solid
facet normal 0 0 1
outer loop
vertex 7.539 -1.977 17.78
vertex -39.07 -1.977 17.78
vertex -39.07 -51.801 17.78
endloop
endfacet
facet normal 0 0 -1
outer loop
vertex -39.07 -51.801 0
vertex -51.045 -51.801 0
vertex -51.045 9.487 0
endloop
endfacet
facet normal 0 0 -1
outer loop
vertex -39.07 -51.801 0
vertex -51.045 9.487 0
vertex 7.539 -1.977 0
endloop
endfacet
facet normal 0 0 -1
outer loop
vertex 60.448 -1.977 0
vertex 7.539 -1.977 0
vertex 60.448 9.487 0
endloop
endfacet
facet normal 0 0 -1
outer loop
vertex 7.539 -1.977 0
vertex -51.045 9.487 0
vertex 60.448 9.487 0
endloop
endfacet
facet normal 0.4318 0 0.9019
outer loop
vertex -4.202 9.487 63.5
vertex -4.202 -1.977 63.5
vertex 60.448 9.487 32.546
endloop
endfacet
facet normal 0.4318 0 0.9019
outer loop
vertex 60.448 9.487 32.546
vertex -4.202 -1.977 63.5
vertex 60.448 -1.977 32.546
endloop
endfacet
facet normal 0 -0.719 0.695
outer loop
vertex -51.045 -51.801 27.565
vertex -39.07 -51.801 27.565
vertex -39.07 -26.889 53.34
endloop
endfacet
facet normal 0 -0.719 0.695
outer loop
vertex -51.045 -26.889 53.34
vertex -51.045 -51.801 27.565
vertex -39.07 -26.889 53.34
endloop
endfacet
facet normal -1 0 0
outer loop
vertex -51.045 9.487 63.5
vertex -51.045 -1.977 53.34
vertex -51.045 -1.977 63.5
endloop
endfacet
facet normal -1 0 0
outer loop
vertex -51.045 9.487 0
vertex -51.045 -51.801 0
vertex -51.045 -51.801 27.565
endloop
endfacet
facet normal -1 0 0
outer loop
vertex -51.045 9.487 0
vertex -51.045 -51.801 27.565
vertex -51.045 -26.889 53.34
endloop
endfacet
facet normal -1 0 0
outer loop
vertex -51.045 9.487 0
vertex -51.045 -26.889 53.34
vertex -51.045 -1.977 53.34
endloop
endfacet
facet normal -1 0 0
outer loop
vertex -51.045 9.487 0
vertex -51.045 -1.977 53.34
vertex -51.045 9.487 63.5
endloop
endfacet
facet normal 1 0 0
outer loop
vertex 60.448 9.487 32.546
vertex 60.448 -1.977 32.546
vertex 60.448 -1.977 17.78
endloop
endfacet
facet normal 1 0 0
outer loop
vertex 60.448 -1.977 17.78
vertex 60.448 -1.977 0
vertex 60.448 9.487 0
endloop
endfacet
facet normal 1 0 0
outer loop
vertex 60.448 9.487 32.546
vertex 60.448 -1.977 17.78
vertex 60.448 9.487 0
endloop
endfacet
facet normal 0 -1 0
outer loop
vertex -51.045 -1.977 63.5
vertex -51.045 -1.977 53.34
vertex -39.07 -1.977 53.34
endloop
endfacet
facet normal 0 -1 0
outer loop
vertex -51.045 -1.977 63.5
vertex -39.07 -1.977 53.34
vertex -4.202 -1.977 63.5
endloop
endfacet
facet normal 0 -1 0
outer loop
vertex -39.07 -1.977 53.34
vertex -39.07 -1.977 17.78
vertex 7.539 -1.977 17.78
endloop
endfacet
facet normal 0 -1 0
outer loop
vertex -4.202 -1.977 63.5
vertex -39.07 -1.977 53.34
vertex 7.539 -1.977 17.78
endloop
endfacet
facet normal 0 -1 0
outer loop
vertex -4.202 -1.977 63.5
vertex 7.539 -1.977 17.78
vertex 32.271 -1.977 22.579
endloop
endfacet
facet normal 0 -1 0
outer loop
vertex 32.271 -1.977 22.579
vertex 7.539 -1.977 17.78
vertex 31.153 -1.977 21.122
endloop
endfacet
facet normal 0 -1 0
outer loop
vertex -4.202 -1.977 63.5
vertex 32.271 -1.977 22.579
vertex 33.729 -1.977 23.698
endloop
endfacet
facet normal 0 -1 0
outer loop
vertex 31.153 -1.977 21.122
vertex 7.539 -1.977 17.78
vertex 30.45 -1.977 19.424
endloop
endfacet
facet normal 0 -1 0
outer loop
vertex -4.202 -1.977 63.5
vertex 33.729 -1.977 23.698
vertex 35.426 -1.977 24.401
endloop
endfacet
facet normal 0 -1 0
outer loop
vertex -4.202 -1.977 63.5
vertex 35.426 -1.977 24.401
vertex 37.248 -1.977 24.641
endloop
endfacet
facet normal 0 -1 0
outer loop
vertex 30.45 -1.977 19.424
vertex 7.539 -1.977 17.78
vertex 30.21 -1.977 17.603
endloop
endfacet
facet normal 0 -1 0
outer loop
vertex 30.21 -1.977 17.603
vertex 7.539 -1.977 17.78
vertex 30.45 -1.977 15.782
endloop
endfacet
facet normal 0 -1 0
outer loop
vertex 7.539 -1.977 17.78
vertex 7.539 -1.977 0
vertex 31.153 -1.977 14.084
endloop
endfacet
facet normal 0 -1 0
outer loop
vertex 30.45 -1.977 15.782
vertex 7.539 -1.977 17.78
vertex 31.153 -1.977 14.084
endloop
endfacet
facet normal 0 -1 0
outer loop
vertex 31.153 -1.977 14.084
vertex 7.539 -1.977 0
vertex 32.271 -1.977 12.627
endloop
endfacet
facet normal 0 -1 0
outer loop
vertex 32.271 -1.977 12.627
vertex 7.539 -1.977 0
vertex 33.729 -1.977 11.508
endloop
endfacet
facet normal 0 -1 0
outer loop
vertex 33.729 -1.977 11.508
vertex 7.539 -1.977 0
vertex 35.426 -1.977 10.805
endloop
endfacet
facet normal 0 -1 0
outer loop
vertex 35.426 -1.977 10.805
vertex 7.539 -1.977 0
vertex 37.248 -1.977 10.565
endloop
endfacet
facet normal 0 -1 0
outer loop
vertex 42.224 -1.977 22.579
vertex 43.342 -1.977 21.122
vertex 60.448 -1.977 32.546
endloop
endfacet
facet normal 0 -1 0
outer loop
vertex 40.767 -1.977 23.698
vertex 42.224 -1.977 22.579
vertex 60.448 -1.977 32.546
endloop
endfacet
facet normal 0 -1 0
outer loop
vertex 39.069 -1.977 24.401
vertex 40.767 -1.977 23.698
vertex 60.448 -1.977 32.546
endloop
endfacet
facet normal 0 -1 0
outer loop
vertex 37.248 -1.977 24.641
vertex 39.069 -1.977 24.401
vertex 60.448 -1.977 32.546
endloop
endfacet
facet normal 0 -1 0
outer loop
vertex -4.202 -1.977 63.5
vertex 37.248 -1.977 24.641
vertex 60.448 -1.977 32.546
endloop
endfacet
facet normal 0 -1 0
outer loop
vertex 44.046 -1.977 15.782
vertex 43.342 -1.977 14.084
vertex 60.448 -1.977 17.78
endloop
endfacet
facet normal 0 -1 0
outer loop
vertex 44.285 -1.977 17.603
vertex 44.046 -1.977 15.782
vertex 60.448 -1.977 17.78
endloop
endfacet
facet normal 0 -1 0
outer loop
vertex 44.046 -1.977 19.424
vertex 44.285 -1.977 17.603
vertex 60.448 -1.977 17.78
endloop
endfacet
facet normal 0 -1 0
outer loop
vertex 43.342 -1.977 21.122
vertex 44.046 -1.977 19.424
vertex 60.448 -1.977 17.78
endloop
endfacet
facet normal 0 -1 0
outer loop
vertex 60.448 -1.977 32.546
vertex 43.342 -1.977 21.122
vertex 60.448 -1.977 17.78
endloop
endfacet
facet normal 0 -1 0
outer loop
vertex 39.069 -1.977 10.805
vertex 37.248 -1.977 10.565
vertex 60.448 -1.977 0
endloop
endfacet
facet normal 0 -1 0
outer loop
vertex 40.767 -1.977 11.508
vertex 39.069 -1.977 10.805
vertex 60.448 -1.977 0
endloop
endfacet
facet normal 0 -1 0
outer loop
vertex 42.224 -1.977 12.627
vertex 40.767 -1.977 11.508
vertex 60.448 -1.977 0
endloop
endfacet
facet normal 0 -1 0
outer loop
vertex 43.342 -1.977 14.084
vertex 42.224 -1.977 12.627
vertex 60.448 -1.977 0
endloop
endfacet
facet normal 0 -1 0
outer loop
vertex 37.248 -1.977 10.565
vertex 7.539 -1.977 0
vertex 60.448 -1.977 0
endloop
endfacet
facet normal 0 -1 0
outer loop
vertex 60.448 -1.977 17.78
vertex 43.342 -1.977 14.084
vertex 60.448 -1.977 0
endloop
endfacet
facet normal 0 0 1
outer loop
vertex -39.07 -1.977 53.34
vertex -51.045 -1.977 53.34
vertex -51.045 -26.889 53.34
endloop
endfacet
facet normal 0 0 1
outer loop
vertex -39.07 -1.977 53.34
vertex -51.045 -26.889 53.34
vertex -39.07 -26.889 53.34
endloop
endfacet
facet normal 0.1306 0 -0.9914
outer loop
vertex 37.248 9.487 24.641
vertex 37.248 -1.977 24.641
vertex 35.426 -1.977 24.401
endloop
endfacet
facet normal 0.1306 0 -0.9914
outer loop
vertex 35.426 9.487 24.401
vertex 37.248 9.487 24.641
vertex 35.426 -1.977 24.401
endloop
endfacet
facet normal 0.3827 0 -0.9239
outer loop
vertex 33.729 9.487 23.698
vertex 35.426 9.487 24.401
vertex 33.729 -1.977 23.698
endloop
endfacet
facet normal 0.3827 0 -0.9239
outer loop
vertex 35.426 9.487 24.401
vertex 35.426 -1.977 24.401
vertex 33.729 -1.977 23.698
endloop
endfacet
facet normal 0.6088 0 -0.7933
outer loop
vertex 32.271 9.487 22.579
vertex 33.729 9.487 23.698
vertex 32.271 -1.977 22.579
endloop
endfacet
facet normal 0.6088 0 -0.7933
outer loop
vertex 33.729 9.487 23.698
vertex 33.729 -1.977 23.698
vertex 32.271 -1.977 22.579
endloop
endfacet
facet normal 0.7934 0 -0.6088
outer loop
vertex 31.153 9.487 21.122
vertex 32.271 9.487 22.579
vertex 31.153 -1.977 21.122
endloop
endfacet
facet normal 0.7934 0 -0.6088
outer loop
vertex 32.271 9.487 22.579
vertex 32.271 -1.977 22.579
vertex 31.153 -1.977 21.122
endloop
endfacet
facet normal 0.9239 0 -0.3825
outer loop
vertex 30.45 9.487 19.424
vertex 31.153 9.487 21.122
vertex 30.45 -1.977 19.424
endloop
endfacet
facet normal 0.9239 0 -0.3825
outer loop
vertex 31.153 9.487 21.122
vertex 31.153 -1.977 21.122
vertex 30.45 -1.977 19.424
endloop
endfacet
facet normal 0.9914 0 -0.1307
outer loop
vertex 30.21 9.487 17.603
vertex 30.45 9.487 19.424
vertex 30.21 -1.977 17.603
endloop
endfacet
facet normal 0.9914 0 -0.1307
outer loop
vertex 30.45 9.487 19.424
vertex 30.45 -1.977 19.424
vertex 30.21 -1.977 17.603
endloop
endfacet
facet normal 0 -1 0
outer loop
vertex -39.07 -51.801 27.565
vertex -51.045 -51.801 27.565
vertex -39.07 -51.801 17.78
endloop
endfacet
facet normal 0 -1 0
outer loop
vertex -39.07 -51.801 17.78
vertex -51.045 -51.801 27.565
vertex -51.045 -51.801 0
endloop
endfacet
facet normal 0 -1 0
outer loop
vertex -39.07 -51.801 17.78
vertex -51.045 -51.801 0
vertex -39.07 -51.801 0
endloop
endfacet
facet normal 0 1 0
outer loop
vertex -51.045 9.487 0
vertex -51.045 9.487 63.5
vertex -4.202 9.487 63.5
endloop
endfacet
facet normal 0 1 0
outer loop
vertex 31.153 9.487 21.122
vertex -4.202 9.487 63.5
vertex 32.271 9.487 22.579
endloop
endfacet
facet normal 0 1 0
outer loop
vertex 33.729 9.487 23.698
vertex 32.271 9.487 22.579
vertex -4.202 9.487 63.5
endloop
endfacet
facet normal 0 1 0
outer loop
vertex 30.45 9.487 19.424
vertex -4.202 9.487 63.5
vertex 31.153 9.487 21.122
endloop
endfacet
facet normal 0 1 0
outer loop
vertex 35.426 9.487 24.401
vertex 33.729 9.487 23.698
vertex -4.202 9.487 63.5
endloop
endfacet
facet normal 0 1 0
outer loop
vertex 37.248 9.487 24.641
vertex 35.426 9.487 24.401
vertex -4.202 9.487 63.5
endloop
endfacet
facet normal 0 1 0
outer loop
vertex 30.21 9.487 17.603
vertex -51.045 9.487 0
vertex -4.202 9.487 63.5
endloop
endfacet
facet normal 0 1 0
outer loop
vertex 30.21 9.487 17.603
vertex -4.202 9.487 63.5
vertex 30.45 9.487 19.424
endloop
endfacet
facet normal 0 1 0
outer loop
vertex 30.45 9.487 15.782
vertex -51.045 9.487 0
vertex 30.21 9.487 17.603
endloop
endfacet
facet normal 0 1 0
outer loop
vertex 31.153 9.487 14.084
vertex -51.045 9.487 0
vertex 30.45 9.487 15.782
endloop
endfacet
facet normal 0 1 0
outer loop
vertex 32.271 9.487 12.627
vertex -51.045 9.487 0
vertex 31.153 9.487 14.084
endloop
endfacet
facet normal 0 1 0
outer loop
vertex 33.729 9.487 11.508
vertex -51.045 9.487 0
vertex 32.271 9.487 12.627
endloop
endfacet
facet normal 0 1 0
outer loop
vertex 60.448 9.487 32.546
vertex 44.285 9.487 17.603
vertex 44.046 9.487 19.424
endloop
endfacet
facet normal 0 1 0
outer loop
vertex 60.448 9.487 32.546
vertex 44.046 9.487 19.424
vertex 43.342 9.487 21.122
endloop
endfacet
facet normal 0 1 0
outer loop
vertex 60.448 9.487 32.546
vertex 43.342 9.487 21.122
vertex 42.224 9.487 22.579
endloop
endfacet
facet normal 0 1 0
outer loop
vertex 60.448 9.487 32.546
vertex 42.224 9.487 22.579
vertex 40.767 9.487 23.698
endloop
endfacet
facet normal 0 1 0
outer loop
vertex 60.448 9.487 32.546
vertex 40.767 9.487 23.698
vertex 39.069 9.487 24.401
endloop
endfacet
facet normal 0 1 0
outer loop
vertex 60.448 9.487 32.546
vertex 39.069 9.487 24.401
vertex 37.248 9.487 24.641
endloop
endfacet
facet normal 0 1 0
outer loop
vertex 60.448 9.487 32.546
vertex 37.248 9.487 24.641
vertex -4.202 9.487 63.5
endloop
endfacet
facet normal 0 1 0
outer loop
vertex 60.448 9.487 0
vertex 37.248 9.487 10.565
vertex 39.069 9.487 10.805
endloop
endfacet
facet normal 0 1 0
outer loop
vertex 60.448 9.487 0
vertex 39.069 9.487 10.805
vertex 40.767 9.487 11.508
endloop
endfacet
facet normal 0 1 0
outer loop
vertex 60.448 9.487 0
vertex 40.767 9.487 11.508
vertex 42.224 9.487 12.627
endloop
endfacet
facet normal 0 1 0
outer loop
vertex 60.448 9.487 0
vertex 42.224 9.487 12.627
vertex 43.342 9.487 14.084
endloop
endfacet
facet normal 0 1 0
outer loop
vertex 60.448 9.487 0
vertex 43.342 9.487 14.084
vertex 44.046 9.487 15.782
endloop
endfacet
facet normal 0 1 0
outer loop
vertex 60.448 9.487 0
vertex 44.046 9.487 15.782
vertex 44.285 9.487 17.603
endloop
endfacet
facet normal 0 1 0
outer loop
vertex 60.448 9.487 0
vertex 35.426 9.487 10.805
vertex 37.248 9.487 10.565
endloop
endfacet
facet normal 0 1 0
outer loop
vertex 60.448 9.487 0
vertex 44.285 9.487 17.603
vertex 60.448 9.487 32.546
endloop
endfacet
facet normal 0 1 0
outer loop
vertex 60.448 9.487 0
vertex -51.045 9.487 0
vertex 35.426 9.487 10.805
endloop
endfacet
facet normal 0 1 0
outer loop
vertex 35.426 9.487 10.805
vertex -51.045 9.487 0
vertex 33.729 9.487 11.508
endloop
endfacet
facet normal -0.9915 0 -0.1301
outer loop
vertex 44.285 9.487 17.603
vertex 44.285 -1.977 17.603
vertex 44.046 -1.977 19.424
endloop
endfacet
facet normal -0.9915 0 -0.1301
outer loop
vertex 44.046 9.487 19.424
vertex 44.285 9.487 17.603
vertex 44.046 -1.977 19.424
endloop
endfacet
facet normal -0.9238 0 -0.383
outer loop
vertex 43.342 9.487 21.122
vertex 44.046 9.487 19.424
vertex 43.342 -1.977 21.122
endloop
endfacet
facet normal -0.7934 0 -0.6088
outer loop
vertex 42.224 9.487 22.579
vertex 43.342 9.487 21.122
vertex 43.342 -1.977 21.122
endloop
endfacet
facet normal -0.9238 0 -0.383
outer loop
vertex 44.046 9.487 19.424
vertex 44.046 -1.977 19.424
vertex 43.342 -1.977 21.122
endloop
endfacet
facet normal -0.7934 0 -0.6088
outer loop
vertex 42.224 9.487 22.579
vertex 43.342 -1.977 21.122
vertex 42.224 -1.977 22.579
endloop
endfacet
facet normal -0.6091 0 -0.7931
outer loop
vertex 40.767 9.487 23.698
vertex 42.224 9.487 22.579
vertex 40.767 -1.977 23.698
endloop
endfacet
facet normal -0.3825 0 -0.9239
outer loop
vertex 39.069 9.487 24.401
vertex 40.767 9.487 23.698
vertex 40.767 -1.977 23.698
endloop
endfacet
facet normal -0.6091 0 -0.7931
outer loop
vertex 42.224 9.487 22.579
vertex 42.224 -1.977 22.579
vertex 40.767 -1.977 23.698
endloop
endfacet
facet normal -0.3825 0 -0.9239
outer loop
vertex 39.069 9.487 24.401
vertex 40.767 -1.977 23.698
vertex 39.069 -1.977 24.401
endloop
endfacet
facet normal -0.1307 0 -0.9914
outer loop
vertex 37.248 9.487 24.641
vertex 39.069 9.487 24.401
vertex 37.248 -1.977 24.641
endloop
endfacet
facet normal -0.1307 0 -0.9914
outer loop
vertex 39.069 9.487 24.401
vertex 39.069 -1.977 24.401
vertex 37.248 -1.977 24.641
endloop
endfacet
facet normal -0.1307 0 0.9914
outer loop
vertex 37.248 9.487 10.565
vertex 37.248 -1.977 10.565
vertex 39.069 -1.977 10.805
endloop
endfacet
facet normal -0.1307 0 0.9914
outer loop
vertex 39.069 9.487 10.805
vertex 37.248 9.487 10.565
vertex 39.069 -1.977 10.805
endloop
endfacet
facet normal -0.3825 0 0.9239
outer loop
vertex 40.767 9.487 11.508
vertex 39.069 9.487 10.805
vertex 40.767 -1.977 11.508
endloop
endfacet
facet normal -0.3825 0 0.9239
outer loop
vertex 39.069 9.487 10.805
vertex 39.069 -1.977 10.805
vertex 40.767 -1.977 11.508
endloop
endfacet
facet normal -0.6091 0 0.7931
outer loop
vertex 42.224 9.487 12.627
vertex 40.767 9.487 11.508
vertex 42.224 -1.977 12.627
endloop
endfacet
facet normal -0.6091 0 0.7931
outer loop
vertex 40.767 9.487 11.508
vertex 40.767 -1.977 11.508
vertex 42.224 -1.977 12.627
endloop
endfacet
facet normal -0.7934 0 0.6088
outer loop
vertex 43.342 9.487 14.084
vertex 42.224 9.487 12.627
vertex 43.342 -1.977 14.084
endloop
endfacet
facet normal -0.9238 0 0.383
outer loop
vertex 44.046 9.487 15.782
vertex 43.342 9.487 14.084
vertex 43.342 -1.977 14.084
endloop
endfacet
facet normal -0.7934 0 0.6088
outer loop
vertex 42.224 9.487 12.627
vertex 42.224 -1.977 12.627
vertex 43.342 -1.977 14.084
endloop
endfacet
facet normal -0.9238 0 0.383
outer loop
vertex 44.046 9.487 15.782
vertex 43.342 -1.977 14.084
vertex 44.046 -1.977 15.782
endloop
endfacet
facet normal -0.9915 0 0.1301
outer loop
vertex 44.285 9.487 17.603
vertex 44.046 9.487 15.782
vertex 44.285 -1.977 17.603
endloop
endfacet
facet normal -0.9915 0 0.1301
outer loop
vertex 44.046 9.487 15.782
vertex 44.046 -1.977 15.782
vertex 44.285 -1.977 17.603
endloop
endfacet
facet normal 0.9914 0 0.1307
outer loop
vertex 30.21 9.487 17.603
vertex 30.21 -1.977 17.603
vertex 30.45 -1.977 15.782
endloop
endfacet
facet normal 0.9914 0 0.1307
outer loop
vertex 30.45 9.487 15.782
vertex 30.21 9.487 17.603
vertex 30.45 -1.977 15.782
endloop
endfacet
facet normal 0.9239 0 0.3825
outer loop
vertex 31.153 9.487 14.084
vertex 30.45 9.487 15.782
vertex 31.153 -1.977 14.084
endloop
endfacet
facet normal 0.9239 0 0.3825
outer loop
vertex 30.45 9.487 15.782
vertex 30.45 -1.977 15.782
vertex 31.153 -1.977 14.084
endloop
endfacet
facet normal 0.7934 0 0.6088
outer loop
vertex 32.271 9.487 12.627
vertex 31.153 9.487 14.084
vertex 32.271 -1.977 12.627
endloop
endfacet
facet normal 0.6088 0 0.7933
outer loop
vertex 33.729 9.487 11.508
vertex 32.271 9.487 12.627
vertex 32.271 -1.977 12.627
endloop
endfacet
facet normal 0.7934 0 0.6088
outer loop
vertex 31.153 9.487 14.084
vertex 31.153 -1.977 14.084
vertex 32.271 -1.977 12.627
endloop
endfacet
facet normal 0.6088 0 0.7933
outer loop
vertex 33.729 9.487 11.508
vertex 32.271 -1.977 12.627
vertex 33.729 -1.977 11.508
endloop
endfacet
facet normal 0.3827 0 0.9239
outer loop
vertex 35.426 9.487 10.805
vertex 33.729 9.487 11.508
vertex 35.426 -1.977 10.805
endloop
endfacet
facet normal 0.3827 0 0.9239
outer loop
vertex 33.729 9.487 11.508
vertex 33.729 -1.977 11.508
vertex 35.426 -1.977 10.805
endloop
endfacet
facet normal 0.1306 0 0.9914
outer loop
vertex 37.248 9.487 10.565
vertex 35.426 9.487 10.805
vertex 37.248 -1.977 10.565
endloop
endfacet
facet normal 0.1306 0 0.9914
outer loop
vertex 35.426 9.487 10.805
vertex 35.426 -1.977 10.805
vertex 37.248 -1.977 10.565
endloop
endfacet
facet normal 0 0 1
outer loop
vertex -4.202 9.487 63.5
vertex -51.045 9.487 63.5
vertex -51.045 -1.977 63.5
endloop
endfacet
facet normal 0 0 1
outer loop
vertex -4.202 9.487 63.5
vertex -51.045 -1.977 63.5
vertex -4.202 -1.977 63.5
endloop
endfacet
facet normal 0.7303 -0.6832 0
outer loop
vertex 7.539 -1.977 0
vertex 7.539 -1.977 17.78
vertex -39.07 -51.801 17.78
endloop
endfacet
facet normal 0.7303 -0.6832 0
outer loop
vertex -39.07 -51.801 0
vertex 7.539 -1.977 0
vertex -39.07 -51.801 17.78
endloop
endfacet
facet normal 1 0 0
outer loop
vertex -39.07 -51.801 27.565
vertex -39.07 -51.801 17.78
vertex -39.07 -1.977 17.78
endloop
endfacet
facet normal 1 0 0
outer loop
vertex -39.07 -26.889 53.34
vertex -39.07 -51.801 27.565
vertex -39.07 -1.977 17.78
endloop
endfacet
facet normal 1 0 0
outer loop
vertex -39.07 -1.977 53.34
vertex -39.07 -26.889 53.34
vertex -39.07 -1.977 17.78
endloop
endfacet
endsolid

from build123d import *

# Parameters (mm, degrees)
F0_W      = 111.4934720099
F0_H      = 61.2878296524
F1_DEPTH  = 17.78
F2_W      = 111.4934720099
F2_H      = 11.4644090645
F3_DEPTH  = 45.72
F4_W      = 11.9753591716
F4_H      = 49.8234205879
F5_DEPTH  = 35.56
F7_DEPTH  = 25.4
F9_DEPTH  = 25.4
F11_DEPTH = 25.4
F13_DEPTH = 25.4


with BuildPart() as f1:
    # F0 (on Top) → F1 (new body)
    with BuildSketch(Plane.XY):
        with Locations((4.7015305609, -21.1568949744)):
            Rectangle(F0_W, F0_H)
    extrude(amount=F1_DEPTH)

    # F2 (on face) → F3 (join)
    with BuildSketch(Plane.XY.offset(17.78)):
        with Locations((4.7015305609, 3.7548153196)):
            Rectangle(F2_W, F2_H)
    extrude(amount=F3_DEPTH)

    # F4 (on face) → F5 (join)
    with BuildSketch(Plane.XY.offset(17.78)):
        with Locations((-45.0575258583, -26.8890995067)):
            Rectangle(F4_W, F4_H)
    extrude(amount=F5_DEPTH)

    # F6 (on face) → F7 (cut)
    with BuildSketch(Plane.YZ.offset(-39.0698462725)):
        Polygon((-51.8008098006, 27.5652259588), (-26.8890995067, 53.34), (-51.8008098006, 53.34), align=None)
    extrude(amount=-F7_DEPTH, mode=Mode.SUBTRACT)

    # F8 (on face) → F9 (cut)
    with BuildSketch(Plane.XZ.offset(1.9773892127)):
        Polygon((60.4482665658, 63.5), (-4.2021470144, 63.5), (60.4482665658, 32.5463265181), align=None)
    extrude(amount=-F9_DEPTH, mode=Mode.SUBTRACT)

    # F10 (on face) → F11 (cut)
    with BuildSketch(Plane.XY.offset(17.78)):
        Polygon((60.4482665658, -1.9773892127), (7.539015729, -1.9773892127), (-39.0698462725, -51.8008098006), (60.4482665658, -51.8008098006), align=None)
    extrude(amount=-F11_DEPTH, mode=Mode.SUBTRACT)

    # F12 (on face) → F13 (cut)
    with BuildSketch(Plane.XZ.offset(1.9773892127)):
        with BuildLine():
            Line((30.2101253638, 17.603026703), (37.2477211058, 17.603026703))
            Line((37.2477211058, 17.603026703), (37.2477211058, 24.640622445))
            ThreePointArc((37.2477211058, 24.640622445), (32.2713894334, 22.5793583754), (30.2101253638, 17.603026703))
        make_face()
        with BuildLine():
            Line((37.2477211058, 24.640622445), (37.2477211058, 17.603026703))
            Line((37.2477211058, 17.603026703), (44.2853168478, 17.603026703))
            ThreePointArc((44.2853168478, 17.603026703), (42.2240527782, 22.5793583754), (37.2477211058, 24.640622445))
        make_face()
        with BuildLine():
            Line((37.2477211058, 10.565430961), (37.2477211058, 17.603026703))
            Line((37.2477211058, 17.603026703), (30.2101253638, 17.603026703))
            ThreePointArc((30.2101253638, 17.603026703), (32.2713894334, 12.6266950306), (37.2477211058, 10.565430961))
        make_face()
        with BuildLine():
            Line((44.2853168478, 17.603026703), (37.2477211058, 17.603026703))
            Line((37.2477211058, 17.603026703), (37.2477211058, 10.565430961))
            ThreePointArc((37.2477211058, 10.565430961), (42.2240527782, 12.6266950306), (44.2853168478, 17.603026703))
        make_face()
    extrude(amount=-F13_DEPTH, mode=Mode.SUBTRACT)


solid = f1.part
